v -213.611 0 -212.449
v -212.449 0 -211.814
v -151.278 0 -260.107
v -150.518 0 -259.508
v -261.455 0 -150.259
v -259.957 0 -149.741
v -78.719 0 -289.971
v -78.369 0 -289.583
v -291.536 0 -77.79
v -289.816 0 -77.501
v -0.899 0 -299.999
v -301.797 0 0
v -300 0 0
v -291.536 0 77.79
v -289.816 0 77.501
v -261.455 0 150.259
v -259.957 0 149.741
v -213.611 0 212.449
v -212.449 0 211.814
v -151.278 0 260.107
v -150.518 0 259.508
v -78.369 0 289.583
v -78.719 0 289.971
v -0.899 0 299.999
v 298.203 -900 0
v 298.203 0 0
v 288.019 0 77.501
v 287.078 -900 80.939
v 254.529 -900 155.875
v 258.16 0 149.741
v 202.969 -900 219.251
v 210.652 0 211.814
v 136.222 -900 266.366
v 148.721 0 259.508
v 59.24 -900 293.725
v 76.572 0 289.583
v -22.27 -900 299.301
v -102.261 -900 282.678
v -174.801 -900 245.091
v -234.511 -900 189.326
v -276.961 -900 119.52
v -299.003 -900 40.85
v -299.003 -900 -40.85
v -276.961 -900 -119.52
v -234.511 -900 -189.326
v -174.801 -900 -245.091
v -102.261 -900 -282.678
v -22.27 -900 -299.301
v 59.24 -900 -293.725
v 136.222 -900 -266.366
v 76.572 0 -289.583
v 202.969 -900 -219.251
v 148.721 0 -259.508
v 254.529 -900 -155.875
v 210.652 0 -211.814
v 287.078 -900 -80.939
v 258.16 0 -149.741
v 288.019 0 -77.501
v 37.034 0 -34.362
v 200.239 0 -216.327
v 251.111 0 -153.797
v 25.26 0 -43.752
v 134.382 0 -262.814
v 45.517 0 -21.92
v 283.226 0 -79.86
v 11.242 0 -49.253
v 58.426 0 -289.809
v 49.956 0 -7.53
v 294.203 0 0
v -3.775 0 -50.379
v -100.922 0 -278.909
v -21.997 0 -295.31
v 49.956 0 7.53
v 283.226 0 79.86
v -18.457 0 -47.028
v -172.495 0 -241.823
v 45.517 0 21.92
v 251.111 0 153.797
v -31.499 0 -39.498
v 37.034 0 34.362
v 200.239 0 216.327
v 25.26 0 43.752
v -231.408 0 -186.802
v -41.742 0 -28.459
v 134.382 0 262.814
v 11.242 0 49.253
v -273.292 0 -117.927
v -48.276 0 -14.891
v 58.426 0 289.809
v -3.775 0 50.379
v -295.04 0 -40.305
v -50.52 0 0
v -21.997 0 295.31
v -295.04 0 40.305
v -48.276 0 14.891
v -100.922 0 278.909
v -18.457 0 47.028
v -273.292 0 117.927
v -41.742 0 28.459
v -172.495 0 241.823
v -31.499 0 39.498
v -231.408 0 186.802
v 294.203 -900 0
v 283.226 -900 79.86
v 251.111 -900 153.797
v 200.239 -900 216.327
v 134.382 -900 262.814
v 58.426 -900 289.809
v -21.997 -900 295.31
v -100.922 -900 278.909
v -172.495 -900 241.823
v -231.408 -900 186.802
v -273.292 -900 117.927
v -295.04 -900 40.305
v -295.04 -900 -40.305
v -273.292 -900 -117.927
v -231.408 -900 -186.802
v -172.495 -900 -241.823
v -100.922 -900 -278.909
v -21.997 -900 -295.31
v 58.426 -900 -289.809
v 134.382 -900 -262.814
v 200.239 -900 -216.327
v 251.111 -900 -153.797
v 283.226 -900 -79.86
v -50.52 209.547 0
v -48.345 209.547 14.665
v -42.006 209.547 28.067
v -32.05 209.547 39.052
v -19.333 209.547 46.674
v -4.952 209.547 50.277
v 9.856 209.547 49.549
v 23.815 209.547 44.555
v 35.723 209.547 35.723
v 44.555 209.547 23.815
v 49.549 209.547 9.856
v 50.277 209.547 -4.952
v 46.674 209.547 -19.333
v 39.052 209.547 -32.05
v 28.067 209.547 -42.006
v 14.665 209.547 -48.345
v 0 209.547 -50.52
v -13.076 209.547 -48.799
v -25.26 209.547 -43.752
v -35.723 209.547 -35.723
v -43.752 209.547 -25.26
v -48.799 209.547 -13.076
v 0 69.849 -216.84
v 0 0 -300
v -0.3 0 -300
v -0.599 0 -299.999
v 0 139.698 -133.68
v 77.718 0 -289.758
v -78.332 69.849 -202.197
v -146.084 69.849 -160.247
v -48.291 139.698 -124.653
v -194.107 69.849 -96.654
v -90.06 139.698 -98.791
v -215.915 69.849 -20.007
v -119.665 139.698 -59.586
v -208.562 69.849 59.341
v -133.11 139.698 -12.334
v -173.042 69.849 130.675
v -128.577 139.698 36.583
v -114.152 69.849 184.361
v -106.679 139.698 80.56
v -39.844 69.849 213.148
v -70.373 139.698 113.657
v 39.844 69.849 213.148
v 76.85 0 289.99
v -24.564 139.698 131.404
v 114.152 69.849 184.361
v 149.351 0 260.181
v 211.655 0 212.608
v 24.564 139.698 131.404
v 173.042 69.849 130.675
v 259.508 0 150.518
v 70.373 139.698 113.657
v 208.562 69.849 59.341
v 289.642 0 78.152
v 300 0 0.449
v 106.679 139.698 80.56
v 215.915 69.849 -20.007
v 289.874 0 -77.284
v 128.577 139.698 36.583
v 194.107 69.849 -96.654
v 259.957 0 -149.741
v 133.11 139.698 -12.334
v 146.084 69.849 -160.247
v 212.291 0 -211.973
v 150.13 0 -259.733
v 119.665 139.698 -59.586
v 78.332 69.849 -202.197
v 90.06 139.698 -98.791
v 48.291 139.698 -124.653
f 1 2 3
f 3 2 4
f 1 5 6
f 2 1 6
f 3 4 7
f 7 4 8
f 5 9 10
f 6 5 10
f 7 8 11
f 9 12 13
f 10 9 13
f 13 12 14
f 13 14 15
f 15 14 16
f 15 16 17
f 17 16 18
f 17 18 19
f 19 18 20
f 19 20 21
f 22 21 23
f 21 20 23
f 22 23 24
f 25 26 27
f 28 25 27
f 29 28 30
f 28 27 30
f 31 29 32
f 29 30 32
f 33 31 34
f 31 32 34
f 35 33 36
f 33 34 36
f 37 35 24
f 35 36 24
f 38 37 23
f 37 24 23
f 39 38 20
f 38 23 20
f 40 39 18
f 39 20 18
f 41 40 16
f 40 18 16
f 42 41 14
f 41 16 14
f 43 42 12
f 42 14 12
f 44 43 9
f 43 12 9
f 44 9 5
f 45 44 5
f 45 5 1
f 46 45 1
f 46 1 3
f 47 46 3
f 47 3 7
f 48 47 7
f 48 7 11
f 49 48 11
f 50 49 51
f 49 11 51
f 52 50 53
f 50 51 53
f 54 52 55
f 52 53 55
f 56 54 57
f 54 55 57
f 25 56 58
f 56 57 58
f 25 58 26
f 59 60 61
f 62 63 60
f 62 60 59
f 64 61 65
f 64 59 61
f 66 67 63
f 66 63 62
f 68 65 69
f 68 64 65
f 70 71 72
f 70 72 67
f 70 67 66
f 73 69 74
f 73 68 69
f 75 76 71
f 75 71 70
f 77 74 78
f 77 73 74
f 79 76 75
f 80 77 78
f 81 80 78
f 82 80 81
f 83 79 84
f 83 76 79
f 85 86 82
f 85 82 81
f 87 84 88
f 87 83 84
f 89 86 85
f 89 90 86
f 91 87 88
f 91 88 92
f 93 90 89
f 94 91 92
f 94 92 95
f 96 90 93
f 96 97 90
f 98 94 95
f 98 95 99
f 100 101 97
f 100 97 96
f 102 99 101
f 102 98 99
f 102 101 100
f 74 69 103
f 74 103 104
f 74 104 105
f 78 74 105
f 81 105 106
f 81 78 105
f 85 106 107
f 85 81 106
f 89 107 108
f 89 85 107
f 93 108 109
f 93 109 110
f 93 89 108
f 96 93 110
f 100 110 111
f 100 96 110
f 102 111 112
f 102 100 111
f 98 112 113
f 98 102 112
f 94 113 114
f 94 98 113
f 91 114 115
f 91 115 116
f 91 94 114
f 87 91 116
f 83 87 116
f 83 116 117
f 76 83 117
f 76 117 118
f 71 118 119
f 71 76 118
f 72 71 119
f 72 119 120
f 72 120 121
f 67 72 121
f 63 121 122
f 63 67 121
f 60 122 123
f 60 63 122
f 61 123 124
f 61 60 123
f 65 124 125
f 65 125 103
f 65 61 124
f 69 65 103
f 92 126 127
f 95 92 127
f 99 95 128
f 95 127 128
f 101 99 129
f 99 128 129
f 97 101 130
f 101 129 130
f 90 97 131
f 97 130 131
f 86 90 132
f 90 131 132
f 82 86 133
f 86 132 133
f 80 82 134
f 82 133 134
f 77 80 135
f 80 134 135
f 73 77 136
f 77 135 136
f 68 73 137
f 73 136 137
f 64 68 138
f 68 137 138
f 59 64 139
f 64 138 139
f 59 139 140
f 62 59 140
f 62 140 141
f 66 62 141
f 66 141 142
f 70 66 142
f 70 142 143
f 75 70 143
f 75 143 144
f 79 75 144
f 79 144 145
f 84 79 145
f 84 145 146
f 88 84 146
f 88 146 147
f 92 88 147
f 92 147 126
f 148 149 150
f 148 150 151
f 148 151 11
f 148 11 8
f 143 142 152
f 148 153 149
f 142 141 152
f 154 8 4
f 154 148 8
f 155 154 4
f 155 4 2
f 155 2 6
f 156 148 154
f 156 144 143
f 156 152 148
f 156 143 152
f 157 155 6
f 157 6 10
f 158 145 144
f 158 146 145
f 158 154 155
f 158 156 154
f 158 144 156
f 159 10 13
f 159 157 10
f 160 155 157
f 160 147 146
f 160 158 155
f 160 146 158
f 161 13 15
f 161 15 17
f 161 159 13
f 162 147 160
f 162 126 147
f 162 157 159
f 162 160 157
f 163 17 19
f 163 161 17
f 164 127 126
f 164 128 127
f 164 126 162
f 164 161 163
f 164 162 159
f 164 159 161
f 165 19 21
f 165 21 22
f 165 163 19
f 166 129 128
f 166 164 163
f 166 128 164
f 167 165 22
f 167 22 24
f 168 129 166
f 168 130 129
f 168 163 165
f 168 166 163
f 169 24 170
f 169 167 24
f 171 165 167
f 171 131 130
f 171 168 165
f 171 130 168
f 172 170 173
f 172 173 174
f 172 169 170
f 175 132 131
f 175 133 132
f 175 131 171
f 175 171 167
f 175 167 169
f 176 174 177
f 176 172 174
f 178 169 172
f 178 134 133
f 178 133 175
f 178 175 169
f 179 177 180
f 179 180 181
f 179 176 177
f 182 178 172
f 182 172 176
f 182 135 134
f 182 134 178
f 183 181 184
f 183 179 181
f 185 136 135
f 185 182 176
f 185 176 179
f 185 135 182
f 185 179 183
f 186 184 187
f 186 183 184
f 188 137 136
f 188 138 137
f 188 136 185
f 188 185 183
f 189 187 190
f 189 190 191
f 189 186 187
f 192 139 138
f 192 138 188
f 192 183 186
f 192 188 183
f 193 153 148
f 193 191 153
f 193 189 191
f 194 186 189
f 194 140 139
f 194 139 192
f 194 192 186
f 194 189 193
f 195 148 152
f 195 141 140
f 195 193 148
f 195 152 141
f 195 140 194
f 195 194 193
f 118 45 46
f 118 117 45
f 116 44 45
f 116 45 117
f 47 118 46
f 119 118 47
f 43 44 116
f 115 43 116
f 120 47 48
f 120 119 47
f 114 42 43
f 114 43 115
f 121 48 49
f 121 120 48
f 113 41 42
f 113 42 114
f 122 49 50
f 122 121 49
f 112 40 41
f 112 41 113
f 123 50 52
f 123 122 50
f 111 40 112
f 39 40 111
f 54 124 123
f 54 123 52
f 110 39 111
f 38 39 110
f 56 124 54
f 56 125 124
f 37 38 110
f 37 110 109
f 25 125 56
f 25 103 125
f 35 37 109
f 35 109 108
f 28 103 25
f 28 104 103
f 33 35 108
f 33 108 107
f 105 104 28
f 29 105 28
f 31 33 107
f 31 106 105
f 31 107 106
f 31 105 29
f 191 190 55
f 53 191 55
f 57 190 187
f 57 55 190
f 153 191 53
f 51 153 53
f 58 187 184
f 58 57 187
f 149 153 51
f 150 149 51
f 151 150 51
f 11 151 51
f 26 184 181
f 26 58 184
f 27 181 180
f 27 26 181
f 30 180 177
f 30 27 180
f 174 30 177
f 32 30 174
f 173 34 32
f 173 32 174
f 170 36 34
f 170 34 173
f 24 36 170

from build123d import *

# Parameters (mm, degrees)
F0_R     = 300
F0_R_2   = 296
F1_DEPTH = 900
F4_R     = 50.52
F5_DEPTH = 250


with BuildPart() as f1:
    # F0 (on Front) → F1 (new body)
    with BuildSketch(Plane.XZ):
        with Locations((-1.797136, 0)):
            Circle(F0_R)
        with Locations((-1.797136, 0)):
            Circle(F0_R_2, mode=Mode.SUBTRACT)
    extrude(amount=F1_DEPTH)

    # F2 (on Right) → F3 (revolve)
    with BuildSketch(Plane.YZ):
        Polygon((209.546715, 0), (0, 0), (0, -300), (209.546715, -50.52), align=None)
    revolve(axis=Axis((0, 104.773358, 0), (0, 1, 0)))

    # F4 (on face) → F5 (cut)
    with BuildSketch(Plane(origin=(0, 209.546715, 0), x_dir=(-1, 0, 0), z_dir=(0, 1, 0))):
        Circle(F4_R)
    extrude(amount=-F5_DEPTH, mode=Mode.SUBTRACT)


solid = f1.part
